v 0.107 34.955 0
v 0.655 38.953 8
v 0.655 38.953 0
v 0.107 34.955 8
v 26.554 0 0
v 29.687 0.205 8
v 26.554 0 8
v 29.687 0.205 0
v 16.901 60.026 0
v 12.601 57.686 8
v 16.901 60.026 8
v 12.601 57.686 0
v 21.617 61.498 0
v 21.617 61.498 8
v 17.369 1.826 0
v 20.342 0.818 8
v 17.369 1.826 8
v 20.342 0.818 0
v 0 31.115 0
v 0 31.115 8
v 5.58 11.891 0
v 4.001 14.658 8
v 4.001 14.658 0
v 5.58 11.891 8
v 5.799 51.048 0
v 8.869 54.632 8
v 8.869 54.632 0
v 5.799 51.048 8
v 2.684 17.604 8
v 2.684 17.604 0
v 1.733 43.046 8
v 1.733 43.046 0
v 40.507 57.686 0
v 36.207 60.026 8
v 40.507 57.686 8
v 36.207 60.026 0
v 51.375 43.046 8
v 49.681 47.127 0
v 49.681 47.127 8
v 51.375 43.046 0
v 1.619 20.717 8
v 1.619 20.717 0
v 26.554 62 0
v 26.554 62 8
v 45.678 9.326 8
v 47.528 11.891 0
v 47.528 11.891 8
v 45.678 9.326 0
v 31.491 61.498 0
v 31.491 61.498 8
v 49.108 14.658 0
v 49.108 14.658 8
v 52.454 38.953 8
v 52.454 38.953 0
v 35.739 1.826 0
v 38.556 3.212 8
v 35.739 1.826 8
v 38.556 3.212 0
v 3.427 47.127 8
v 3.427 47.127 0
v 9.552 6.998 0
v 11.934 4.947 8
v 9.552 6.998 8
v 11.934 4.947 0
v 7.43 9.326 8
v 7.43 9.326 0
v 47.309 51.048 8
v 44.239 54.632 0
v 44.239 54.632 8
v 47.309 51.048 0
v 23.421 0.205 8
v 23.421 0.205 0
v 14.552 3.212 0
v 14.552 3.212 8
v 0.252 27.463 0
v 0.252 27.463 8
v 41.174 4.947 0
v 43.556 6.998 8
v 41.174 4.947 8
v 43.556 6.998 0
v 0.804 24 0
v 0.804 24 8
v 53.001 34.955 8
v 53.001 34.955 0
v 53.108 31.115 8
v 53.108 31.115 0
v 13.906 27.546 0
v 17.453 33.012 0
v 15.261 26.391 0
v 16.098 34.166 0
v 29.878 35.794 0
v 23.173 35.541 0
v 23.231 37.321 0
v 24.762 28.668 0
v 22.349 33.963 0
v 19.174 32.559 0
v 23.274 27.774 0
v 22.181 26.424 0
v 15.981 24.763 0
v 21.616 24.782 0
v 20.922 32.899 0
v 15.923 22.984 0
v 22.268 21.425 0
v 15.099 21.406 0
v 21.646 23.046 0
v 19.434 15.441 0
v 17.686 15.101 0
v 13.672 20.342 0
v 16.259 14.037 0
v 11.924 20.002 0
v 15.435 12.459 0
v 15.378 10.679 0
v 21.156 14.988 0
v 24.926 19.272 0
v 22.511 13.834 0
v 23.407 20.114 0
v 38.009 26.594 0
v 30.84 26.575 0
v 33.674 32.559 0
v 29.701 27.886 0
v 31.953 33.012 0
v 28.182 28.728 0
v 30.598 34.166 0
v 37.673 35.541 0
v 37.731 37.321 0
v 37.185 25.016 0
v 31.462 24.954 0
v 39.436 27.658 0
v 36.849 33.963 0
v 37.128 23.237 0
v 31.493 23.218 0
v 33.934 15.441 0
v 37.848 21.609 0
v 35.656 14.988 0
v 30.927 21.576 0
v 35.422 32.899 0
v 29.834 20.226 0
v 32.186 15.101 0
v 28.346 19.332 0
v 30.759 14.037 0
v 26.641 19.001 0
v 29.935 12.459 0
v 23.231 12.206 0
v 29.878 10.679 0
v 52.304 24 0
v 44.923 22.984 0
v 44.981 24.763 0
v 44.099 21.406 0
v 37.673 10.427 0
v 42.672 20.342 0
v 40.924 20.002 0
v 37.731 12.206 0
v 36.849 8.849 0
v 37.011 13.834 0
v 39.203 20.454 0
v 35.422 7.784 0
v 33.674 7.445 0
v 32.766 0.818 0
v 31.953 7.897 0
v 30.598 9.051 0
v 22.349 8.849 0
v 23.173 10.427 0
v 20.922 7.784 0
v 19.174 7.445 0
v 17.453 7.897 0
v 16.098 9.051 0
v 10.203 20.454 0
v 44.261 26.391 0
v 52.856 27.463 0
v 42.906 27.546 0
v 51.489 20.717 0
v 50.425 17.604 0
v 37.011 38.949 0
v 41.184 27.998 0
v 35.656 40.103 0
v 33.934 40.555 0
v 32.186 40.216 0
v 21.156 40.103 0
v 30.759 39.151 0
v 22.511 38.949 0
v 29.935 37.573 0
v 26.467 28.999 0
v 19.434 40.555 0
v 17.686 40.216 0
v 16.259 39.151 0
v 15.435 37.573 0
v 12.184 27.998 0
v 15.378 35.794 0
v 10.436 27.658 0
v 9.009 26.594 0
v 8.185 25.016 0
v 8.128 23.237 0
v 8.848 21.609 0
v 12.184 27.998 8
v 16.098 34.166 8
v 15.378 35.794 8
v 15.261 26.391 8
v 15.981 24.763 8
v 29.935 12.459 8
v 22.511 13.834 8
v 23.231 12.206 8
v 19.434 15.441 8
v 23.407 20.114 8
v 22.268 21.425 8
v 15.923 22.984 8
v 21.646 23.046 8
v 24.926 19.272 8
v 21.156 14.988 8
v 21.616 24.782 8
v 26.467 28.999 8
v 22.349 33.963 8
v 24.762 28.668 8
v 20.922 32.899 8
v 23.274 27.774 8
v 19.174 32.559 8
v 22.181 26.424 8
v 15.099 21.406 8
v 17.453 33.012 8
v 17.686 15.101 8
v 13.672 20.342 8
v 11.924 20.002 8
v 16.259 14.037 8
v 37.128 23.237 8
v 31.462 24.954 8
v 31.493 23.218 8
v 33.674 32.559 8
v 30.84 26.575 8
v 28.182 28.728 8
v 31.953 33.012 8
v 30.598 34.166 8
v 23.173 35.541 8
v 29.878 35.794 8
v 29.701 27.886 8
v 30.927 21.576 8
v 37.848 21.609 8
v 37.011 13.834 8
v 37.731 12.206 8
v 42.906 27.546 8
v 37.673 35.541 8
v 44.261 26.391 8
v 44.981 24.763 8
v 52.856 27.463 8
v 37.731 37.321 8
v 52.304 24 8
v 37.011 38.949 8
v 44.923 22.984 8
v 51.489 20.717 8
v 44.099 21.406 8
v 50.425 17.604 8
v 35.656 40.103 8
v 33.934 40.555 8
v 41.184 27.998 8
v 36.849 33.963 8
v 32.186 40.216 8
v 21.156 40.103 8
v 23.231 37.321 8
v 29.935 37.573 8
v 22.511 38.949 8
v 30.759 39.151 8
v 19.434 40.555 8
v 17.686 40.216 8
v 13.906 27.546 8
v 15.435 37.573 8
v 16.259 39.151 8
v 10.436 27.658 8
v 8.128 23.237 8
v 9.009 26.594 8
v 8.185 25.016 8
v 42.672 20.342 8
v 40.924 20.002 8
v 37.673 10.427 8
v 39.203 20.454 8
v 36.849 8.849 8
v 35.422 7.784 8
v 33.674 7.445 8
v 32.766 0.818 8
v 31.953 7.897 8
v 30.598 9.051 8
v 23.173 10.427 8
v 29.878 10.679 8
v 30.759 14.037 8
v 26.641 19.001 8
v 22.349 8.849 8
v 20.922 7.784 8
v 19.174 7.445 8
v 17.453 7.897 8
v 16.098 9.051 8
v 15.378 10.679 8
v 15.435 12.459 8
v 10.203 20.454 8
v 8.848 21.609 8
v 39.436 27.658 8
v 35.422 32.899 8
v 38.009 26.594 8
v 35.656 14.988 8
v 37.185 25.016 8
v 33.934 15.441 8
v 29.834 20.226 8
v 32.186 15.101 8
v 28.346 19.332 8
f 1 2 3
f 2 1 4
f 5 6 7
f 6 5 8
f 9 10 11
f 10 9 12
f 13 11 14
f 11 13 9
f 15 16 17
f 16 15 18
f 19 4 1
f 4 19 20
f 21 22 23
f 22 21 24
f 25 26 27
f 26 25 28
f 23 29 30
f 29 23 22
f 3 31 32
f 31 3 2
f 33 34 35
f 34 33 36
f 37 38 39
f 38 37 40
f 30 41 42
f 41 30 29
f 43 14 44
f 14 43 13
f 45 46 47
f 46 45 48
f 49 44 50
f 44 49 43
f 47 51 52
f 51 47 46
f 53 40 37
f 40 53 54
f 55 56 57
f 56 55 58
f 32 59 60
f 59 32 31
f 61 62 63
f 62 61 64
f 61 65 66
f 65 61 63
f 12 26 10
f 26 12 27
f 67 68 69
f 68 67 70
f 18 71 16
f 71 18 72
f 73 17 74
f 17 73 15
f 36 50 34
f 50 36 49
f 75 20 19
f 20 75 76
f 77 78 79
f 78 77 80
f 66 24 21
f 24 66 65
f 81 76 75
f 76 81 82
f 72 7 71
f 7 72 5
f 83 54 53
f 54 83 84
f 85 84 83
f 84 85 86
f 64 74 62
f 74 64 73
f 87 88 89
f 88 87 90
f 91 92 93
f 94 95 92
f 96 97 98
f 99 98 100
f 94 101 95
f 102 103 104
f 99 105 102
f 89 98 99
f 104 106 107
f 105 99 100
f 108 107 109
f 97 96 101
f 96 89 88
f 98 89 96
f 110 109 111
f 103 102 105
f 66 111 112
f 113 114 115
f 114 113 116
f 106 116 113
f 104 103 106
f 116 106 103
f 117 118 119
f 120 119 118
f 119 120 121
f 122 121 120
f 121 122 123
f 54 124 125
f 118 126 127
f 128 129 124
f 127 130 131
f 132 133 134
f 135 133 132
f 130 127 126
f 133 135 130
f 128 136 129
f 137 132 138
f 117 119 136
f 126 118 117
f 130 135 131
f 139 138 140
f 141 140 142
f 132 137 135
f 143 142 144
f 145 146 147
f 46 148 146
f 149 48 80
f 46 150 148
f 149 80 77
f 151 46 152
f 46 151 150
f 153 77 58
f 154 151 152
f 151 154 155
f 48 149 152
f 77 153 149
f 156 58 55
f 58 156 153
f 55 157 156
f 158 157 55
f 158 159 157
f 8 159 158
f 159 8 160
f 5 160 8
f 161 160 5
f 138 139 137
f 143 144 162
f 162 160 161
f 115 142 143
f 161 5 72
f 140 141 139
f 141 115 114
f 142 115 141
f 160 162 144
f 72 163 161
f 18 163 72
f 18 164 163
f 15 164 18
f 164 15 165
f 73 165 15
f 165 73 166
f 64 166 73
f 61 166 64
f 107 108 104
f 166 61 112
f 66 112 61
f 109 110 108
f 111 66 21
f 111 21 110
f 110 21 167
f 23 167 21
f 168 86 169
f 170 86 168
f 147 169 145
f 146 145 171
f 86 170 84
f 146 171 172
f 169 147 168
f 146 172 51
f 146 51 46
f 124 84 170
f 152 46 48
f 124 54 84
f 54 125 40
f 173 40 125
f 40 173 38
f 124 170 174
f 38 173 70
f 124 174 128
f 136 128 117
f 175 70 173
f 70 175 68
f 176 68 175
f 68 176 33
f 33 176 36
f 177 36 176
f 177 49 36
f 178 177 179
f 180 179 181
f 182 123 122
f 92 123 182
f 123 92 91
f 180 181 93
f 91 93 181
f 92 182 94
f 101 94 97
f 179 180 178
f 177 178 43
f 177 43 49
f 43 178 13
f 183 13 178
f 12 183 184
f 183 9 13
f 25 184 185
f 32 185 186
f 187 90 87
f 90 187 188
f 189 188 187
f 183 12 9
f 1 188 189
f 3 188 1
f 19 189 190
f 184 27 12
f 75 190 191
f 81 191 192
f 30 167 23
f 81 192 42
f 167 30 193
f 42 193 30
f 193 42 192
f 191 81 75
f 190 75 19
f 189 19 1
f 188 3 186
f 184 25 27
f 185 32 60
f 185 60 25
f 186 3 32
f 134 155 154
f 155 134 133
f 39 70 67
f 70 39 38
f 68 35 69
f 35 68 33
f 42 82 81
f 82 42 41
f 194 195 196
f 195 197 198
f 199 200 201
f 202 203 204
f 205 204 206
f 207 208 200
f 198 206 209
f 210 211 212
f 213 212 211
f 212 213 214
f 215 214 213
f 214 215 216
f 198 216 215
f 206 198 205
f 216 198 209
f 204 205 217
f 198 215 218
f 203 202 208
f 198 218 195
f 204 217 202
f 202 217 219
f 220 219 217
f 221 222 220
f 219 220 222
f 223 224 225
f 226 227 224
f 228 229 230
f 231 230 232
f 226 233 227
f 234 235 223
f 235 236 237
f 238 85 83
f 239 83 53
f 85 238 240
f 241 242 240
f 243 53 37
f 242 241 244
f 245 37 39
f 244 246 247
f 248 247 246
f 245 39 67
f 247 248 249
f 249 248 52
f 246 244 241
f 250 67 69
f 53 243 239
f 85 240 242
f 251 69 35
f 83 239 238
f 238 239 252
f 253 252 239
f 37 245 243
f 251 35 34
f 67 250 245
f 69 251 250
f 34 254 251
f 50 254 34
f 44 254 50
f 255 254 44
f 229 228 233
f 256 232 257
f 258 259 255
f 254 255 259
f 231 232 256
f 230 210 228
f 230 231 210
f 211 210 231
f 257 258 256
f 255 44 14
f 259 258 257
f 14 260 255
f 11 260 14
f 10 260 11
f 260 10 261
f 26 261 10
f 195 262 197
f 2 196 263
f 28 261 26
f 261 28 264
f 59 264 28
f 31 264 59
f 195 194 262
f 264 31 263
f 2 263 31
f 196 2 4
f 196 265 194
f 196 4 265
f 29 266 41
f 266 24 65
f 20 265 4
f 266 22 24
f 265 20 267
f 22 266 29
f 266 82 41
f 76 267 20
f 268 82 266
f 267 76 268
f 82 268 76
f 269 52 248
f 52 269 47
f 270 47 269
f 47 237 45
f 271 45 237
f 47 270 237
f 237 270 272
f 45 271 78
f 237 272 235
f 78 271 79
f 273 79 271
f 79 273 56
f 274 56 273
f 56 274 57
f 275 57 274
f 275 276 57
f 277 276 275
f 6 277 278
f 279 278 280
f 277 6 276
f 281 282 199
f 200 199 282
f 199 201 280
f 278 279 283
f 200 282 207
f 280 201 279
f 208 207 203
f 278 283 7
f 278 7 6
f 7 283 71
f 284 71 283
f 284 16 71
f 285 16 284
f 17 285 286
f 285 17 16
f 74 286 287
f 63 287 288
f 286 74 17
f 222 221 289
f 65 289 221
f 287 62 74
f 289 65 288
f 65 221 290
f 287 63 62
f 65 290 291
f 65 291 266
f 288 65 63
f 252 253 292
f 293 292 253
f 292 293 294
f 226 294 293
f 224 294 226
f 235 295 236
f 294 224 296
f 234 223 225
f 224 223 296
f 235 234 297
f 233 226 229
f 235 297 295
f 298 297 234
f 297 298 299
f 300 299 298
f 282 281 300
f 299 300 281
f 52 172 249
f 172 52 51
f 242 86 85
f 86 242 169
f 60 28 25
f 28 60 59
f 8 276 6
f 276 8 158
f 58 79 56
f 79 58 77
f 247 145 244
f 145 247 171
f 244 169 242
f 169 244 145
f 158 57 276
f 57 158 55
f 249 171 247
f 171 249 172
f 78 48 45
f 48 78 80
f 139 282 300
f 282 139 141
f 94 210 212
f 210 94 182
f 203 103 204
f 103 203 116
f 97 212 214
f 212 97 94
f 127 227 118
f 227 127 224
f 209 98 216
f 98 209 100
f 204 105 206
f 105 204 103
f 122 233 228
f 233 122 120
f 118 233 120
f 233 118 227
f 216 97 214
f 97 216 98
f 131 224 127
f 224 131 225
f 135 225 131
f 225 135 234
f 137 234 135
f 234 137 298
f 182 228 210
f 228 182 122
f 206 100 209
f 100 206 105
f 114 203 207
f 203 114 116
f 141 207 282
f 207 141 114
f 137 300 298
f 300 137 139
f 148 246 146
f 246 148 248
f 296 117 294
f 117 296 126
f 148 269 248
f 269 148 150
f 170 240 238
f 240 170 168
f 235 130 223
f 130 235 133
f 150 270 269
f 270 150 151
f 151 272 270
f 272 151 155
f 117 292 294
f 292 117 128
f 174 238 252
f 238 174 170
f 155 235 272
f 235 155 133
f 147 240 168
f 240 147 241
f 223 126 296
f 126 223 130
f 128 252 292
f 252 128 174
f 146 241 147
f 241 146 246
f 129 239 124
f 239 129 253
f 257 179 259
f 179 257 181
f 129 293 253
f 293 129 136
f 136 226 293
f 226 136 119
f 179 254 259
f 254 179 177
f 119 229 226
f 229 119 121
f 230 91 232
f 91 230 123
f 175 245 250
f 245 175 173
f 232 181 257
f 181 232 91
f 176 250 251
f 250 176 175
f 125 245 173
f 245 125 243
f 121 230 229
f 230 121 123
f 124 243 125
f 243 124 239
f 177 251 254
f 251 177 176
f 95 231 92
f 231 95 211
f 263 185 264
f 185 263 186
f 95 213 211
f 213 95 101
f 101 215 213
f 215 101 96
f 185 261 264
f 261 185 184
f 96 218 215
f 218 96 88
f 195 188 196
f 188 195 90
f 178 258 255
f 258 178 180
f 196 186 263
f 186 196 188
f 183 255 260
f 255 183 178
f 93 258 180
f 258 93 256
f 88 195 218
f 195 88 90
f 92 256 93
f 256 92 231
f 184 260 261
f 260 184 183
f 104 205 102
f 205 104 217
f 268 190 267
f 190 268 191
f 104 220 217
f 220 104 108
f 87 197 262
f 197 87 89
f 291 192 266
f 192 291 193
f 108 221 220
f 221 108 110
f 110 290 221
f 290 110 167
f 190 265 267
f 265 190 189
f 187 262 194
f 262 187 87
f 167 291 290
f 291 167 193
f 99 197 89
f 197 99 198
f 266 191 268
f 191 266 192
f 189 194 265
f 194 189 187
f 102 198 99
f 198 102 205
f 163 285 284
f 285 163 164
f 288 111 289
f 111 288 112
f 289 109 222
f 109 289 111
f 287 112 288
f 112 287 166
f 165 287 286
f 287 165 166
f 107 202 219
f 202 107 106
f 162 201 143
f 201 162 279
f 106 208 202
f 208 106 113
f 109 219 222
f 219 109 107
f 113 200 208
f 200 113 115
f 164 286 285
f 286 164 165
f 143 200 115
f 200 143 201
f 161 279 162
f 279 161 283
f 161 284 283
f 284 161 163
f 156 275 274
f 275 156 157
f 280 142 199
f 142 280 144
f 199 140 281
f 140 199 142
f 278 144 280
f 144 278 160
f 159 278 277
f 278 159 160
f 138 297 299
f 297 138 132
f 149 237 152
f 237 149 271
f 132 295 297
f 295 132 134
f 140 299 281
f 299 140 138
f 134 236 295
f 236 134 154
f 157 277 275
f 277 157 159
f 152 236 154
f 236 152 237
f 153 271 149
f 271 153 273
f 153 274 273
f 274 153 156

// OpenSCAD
$fn = 32;

// ----------------------------------------------------------------------
// Cam plate: single_lobe cam, base R24
// ----------------------------------------------------------------------

// --- parameters (mm) ---
base_r = 24;              // base circle radius
lobe_h = 14;              // cam lobe rise
bore_r = 5;               // shaft bore radius
plate_t = 8;              // plate thickness, Z (extrusion height)
ring_r = 14.5;            // lightening ring radius
bolt_r = 4;               // lightening hole radius

profile = [[52.304, 24], [52.856, 27.463], [53.108, 31.115], [53.001, 34.955], [52.454, 38.953], [51.375, 43.046], [49.681, 47.127], [47.309, 51.048], [44.239, 54.632], [40.507, 57.686], [36.207, 60.026], [31.491, 61.498], [26.554, 62], [21.617, 61.498], [16.901, 60.026], [12.601, 57.686], [8.869, 54.632], [5.799, 51.048], [3.427, 47.127], [1.733, 43.046], [0.655, 38.953], [0.107, 34.955], [0, 31.115], [0.252, 27.463], [0.804, 24], [1.619, 20.717], [2.684, 17.604], [4.001, 14.658], [5.58, 11.891], [7.43, 9.326], [9.552, 6.998], [11.934, 4.947], [14.552, 3.212], [17.369, 1.826], [20.342, 0.818], [23.421, 0.205], [26.554, 0], [29.687, 0.205], [32.766, 0.818], [35.739, 1.826], [38.556, 3.212], [41.174, 4.947], [43.556, 6.998], [45.678, 9.326], [47.528, 11.891], [49.108, 14.658], [50.425, 17.604], [51.489, 20.717]];  // primary outline, 48 points, counter clockwise
void_1 = [[31.462, 24.954], [30.84, 26.575], [29.701, 27.886], [28.182, 28.728], [26.467, 28.999], [24.762, 28.668], [23.274, 27.774], [22.181, 26.424], [21.616, 24.782], [21.646, 23.046], [22.268, 21.425], [23.407, 20.114], [24.926, 19.272], [26.641, 19.001], [28.346, 19.332], [29.834, 20.226], [30.927, 21.576], [31.493, 23.218]];  // shaft bore, 18 points
void_2 = [[44.981, 24.763], [44.261, 26.391], [42.906, 27.546], [41.184, 27.998], [39.436, 27.658], [38.009, 26.594], [37.185, 25.016], [37.128, 23.237], [37.848, 21.609], [39.203, 20.454], [40.924, 20.002], [42.672, 20.342], [44.099, 21.406], [44.923, 22.984]];  // lightening hole 1, 14 points
void_3 = [[37.731, 37.321], [37.011, 38.949], [35.656, 40.103], [33.934, 40.555], [32.186, 40.216], [30.759, 39.151], [29.935, 37.573], [29.878, 35.794], [30.598, 34.166], [31.953, 33.012], [33.674, 32.559], [35.422, 32.899], [36.849, 33.963], [37.673, 35.541]];  // lightening hole 2, 14 points
void_4 = [[23.231, 37.321], [22.511, 38.949], [21.156, 40.103], [19.434, 40.555], [17.686, 40.216], [16.259, 39.151], [15.435, 37.573], [15.378, 35.794], [16.098, 34.166], [17.453, 33.012], [19.174, 32.559], [20.922, 32.899], [22.349, 33.963], [23.173, 35.541]];  // lightening hole 3, 14 points
void_5 = [[15.981, 24.763], [15.261, 26.391], [13.906, 27.546], [12.184, 27.998], [10.436, 27.658], [9.009, 26.594], [8.185, 25.016], [8.128, 23.237], [8.848, 21.609], [10.203, 20.454], [11.924, 20.002], [13.672, 20.342], [15.099, 21.406], [15.923, 22.984]];  // lightening hole 4, 14 points
void_6 = [[23.231, 12.206], [22.511, 13.834], [21.156, 14.988], [19.434, 15.441], [17.686, 15.101], [16.259, 14.037], [15.435, 12.459], [15.378, 10.679], [16.098, 9.051], [17.453, 7.897], [19.174, 7.445], [20.922, 7.784], [22.349, 8.849], [23.173, 10.427]];  // lightening hole 5, 14 points
void_7 = [[37.731, 12.206], [37.011, 13.834], [35.656, 14.988], [33.934, 15.441], [32.186, 15.101], [30.759, 14.037], [29.935, 12.459], [29.878, 10.679], [30.598, 9.051], [31.953, 7.897], [33.674, 7.445], [35.422, 7.784], [36.849, 8.849], [37.673, 10.427]];  // lightening hole 6, 14 points

// --- the one profile operation ---
difference() {
  linear_extrude(height = plate_t) polygon(points = profile);
  translate([0, 0, -1])
    linear_extrude(height = plate_t + 2) polygon(points = void_1);
  translate([0, 0, -1])
    linear_extrude(height = plate_t + 2) polygon(points = void_2);
  translate([0, 0, -1])
    linear_extrude(height = plate_t + 2) polygon(points = void_3);
  translate([0, 0, -1])
    linear_extrude(height = plate_t + 2) polygon(points = void_4);
  translate([0, 0, -1])
    linear_extrude(height = plate_t + 2) polygon(points = void_5);
  translate([0, 0, -1])
    linear_extrude(height = plate_t + 2) polygon(points = void_6);
  translate([0, 0, -1])
    linear_extrude(height = plate_t + 2) polygon(points = void_7);
}
